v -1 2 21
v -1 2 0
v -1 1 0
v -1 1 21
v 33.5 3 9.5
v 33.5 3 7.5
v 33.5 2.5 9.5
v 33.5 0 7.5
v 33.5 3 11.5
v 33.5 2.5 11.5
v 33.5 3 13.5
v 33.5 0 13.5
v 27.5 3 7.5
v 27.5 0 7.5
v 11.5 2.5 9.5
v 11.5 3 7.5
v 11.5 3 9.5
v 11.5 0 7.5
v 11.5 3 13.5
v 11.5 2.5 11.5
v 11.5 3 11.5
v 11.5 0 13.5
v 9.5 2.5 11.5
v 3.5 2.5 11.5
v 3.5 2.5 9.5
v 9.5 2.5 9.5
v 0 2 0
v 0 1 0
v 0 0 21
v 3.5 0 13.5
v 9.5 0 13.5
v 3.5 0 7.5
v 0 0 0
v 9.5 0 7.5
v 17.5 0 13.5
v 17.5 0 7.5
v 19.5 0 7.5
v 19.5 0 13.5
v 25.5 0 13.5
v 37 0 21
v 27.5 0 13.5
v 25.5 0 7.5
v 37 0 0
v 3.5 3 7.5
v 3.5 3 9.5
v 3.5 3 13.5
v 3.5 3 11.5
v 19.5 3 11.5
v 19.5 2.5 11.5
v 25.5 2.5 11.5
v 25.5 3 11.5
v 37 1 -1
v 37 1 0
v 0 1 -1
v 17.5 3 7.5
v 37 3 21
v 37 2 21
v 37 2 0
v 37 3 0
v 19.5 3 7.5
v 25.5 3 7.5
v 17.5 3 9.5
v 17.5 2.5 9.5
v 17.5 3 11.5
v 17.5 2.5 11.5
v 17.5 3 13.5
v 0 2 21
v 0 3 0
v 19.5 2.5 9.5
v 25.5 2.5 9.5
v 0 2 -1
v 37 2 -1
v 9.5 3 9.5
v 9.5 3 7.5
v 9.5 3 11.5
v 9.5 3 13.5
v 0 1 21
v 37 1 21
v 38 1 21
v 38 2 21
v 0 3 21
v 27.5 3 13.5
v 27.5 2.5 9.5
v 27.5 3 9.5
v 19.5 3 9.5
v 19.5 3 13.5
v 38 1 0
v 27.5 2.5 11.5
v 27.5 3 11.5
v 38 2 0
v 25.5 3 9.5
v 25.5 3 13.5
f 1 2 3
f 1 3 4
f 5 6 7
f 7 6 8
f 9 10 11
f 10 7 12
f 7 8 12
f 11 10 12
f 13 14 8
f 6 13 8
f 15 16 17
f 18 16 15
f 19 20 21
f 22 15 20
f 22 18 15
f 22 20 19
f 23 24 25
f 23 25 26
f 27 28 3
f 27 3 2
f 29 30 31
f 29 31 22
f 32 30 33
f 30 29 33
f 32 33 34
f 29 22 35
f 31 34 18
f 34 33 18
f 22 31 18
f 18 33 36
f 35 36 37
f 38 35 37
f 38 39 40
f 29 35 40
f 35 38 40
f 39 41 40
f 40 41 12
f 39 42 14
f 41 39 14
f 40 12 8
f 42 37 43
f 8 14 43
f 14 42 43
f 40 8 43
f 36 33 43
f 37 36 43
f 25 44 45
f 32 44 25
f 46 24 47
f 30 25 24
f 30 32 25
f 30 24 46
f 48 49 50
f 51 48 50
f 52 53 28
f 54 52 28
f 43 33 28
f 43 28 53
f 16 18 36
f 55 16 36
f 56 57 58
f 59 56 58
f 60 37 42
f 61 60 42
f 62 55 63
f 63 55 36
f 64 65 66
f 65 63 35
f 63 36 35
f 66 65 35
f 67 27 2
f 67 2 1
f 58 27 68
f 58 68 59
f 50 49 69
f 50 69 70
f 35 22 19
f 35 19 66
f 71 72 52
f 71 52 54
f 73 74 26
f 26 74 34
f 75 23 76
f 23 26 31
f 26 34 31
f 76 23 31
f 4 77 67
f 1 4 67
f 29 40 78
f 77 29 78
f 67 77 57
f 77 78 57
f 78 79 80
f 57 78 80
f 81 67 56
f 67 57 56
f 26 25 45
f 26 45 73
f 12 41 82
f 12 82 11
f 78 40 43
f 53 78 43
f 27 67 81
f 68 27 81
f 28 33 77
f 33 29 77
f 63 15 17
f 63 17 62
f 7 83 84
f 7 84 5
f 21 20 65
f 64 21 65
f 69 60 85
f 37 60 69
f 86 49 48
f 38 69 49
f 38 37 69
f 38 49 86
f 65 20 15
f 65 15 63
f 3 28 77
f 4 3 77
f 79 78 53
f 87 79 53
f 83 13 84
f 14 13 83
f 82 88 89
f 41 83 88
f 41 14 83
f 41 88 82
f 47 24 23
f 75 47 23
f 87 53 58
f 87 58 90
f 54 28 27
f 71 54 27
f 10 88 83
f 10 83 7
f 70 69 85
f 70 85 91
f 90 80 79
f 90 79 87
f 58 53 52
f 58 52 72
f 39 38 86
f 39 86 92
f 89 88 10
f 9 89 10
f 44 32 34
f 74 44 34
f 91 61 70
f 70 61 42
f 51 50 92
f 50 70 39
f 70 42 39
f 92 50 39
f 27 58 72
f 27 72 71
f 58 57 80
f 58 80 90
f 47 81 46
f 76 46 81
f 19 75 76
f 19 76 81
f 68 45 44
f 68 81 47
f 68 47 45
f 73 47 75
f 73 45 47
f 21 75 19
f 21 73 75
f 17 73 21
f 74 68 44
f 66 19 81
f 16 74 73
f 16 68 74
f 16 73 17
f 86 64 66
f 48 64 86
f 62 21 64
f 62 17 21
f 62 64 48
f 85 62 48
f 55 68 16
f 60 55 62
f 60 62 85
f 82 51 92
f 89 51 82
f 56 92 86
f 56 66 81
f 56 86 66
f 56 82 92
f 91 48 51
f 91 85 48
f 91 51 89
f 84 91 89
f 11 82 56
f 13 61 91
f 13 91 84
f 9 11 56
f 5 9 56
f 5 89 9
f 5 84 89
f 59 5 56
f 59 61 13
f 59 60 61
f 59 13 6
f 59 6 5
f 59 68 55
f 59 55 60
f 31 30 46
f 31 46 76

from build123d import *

# Parameters (mm, degrees)
SKETCH_1_W          = 37
SKETCH_1_H          = 21
EXTRUDE_1_DEPTH     = 3
SKETCH_2_W          = 6
SKETCH_2_H          = 2
CUT_EXTRUDE_1_DEPTH = 10
SKETCH_2_10_W       = 6
SKETCH_2_10_H       = 2
CUT_EXTRUDE_2_DEPTH = 2.5
SKETCH_5_W          = 21
SKETCH_5_H          = 1
EXTRUDE_2_DEPTH     = 1
SKETCH_7_W          = 37
SKETCH_7_H          = 1
EXTRUDE_3_DEPTH     = 1
SKETCH_8_W          = 21
SKETCH_8_H          = 1
EXTRUDE_4_DEPTH     = 1


with BuildPart() as part:
    # Эскиз1 → Бобышка-Вытянуть1 (new body)
    with BuildSketch(Plane(origin=(0, 0, 0), x_dir=(1, 0, 0), z_dir=(0, 1, 0))):
        with Locations((18.5, -10.5)):
            Rectangle(SKETCH_1_W, SKETCH_1_H)
    extrude(amount=EXTRUDE_1_DEPTH)

    # Эскиз2 → Вырез-Вытянуть1 (cut)
    with BuildSketch(Plane.XZ):
        with Locations((6.5, 12.5)):
            Rectangle(SKETCH_2_W, SKETCH_2_H)
        with Locations((6.5, 8.5)):
            Rectangle(SKETCH_2_W, SKETCH_2_H)
        with Locations((14.5, 12.5)):
            Rectangle(SKETCH_2_W, SKETCH_2_H)
        with Locations((14.5, 8.5)):
            Rectangle(SKETCH_2_W, SKETCH_2_H)
        with Locations((22.5, 12.5)):
            Rectangle(SKETCH_2_W, SKETCH_2_H)
        with Locations((22.5, 8.5)):
            Rectangle(SKETCH_2_W, SKETCH_2_H)
        with Locations((30.5, 12.5)):
            Rectangle(SKETCH_2_W, SKETCH_2_H)
        with Locations((30.5, 8.5)):
            Rectangle(SKETCH_2_W, SKETCH_2_H)
    extrude(amount=-CUT_EXTRUDE_1_DEPTH, mode=Mode.SUBTRACT)

    # Эскиз2<10> → Вырез-Вытянуть2 (cut)
    with BuildSketch(Plane.XZ):
        with Locations((6.5, 10.5)):
            Rectangle(SKETCH_2_10_W, SKETCH_2_10_H)
        with Locations((14.5, 10.5)):
            Rectangle(SKETCH_2_10_W, SKETCH_2_10_H)
        with Locations((22.5, 10.5)):
            Rectangle(SKETCH_2_10_W, SKETCH_2_10_H)
        with Locations((30.5, 10.5)):
            Rectangle(SKETCH_2_10_W, SKETCH_2_10_H)
    extrude(amount=-CUT_EXTRUDE_2_DEPTH, mode=Mode.SUBTRACT)

    # Эскиз5 → Бобышка-Вытянуть2 (add)
    with BuildSketch(Plane(origin=(37, 0, 0), x_dir=(0, 0, -1), z_dir=(1, 0, 0))):
        with Locations((-10.5, 1.5)):
            Rectangle(SKETCH_5_W, SKETCH_5_H)
    extrude(amount=EXTRUDE_2_DEPTH)

    # Эскиз7 → Бобышка-Вытянуть3 (add)
    with BuildSketch(Plane(origin=(0, 0, 0), x_dir=(-1, 0, 0), z_dir=(0, 0, -1))):
        with Locations((-18.5, 1.5)):
            Rectangle(SKETCH_7_W, SKETCH_7_H)
    extrude(amount=EXTRUDE_3_DEPTH)

    # Эскиз8 → Бобышка-Вытянуть4 (add)
    with BuildSketch(Plane.ZY):
        with Locations((10.5, 1.5)):
            Rectangle(SKETCH_8_W, SKETCH_8_H)
    extrude(amount=EXTRUDE_4_DEPTH)


solid = part.part
